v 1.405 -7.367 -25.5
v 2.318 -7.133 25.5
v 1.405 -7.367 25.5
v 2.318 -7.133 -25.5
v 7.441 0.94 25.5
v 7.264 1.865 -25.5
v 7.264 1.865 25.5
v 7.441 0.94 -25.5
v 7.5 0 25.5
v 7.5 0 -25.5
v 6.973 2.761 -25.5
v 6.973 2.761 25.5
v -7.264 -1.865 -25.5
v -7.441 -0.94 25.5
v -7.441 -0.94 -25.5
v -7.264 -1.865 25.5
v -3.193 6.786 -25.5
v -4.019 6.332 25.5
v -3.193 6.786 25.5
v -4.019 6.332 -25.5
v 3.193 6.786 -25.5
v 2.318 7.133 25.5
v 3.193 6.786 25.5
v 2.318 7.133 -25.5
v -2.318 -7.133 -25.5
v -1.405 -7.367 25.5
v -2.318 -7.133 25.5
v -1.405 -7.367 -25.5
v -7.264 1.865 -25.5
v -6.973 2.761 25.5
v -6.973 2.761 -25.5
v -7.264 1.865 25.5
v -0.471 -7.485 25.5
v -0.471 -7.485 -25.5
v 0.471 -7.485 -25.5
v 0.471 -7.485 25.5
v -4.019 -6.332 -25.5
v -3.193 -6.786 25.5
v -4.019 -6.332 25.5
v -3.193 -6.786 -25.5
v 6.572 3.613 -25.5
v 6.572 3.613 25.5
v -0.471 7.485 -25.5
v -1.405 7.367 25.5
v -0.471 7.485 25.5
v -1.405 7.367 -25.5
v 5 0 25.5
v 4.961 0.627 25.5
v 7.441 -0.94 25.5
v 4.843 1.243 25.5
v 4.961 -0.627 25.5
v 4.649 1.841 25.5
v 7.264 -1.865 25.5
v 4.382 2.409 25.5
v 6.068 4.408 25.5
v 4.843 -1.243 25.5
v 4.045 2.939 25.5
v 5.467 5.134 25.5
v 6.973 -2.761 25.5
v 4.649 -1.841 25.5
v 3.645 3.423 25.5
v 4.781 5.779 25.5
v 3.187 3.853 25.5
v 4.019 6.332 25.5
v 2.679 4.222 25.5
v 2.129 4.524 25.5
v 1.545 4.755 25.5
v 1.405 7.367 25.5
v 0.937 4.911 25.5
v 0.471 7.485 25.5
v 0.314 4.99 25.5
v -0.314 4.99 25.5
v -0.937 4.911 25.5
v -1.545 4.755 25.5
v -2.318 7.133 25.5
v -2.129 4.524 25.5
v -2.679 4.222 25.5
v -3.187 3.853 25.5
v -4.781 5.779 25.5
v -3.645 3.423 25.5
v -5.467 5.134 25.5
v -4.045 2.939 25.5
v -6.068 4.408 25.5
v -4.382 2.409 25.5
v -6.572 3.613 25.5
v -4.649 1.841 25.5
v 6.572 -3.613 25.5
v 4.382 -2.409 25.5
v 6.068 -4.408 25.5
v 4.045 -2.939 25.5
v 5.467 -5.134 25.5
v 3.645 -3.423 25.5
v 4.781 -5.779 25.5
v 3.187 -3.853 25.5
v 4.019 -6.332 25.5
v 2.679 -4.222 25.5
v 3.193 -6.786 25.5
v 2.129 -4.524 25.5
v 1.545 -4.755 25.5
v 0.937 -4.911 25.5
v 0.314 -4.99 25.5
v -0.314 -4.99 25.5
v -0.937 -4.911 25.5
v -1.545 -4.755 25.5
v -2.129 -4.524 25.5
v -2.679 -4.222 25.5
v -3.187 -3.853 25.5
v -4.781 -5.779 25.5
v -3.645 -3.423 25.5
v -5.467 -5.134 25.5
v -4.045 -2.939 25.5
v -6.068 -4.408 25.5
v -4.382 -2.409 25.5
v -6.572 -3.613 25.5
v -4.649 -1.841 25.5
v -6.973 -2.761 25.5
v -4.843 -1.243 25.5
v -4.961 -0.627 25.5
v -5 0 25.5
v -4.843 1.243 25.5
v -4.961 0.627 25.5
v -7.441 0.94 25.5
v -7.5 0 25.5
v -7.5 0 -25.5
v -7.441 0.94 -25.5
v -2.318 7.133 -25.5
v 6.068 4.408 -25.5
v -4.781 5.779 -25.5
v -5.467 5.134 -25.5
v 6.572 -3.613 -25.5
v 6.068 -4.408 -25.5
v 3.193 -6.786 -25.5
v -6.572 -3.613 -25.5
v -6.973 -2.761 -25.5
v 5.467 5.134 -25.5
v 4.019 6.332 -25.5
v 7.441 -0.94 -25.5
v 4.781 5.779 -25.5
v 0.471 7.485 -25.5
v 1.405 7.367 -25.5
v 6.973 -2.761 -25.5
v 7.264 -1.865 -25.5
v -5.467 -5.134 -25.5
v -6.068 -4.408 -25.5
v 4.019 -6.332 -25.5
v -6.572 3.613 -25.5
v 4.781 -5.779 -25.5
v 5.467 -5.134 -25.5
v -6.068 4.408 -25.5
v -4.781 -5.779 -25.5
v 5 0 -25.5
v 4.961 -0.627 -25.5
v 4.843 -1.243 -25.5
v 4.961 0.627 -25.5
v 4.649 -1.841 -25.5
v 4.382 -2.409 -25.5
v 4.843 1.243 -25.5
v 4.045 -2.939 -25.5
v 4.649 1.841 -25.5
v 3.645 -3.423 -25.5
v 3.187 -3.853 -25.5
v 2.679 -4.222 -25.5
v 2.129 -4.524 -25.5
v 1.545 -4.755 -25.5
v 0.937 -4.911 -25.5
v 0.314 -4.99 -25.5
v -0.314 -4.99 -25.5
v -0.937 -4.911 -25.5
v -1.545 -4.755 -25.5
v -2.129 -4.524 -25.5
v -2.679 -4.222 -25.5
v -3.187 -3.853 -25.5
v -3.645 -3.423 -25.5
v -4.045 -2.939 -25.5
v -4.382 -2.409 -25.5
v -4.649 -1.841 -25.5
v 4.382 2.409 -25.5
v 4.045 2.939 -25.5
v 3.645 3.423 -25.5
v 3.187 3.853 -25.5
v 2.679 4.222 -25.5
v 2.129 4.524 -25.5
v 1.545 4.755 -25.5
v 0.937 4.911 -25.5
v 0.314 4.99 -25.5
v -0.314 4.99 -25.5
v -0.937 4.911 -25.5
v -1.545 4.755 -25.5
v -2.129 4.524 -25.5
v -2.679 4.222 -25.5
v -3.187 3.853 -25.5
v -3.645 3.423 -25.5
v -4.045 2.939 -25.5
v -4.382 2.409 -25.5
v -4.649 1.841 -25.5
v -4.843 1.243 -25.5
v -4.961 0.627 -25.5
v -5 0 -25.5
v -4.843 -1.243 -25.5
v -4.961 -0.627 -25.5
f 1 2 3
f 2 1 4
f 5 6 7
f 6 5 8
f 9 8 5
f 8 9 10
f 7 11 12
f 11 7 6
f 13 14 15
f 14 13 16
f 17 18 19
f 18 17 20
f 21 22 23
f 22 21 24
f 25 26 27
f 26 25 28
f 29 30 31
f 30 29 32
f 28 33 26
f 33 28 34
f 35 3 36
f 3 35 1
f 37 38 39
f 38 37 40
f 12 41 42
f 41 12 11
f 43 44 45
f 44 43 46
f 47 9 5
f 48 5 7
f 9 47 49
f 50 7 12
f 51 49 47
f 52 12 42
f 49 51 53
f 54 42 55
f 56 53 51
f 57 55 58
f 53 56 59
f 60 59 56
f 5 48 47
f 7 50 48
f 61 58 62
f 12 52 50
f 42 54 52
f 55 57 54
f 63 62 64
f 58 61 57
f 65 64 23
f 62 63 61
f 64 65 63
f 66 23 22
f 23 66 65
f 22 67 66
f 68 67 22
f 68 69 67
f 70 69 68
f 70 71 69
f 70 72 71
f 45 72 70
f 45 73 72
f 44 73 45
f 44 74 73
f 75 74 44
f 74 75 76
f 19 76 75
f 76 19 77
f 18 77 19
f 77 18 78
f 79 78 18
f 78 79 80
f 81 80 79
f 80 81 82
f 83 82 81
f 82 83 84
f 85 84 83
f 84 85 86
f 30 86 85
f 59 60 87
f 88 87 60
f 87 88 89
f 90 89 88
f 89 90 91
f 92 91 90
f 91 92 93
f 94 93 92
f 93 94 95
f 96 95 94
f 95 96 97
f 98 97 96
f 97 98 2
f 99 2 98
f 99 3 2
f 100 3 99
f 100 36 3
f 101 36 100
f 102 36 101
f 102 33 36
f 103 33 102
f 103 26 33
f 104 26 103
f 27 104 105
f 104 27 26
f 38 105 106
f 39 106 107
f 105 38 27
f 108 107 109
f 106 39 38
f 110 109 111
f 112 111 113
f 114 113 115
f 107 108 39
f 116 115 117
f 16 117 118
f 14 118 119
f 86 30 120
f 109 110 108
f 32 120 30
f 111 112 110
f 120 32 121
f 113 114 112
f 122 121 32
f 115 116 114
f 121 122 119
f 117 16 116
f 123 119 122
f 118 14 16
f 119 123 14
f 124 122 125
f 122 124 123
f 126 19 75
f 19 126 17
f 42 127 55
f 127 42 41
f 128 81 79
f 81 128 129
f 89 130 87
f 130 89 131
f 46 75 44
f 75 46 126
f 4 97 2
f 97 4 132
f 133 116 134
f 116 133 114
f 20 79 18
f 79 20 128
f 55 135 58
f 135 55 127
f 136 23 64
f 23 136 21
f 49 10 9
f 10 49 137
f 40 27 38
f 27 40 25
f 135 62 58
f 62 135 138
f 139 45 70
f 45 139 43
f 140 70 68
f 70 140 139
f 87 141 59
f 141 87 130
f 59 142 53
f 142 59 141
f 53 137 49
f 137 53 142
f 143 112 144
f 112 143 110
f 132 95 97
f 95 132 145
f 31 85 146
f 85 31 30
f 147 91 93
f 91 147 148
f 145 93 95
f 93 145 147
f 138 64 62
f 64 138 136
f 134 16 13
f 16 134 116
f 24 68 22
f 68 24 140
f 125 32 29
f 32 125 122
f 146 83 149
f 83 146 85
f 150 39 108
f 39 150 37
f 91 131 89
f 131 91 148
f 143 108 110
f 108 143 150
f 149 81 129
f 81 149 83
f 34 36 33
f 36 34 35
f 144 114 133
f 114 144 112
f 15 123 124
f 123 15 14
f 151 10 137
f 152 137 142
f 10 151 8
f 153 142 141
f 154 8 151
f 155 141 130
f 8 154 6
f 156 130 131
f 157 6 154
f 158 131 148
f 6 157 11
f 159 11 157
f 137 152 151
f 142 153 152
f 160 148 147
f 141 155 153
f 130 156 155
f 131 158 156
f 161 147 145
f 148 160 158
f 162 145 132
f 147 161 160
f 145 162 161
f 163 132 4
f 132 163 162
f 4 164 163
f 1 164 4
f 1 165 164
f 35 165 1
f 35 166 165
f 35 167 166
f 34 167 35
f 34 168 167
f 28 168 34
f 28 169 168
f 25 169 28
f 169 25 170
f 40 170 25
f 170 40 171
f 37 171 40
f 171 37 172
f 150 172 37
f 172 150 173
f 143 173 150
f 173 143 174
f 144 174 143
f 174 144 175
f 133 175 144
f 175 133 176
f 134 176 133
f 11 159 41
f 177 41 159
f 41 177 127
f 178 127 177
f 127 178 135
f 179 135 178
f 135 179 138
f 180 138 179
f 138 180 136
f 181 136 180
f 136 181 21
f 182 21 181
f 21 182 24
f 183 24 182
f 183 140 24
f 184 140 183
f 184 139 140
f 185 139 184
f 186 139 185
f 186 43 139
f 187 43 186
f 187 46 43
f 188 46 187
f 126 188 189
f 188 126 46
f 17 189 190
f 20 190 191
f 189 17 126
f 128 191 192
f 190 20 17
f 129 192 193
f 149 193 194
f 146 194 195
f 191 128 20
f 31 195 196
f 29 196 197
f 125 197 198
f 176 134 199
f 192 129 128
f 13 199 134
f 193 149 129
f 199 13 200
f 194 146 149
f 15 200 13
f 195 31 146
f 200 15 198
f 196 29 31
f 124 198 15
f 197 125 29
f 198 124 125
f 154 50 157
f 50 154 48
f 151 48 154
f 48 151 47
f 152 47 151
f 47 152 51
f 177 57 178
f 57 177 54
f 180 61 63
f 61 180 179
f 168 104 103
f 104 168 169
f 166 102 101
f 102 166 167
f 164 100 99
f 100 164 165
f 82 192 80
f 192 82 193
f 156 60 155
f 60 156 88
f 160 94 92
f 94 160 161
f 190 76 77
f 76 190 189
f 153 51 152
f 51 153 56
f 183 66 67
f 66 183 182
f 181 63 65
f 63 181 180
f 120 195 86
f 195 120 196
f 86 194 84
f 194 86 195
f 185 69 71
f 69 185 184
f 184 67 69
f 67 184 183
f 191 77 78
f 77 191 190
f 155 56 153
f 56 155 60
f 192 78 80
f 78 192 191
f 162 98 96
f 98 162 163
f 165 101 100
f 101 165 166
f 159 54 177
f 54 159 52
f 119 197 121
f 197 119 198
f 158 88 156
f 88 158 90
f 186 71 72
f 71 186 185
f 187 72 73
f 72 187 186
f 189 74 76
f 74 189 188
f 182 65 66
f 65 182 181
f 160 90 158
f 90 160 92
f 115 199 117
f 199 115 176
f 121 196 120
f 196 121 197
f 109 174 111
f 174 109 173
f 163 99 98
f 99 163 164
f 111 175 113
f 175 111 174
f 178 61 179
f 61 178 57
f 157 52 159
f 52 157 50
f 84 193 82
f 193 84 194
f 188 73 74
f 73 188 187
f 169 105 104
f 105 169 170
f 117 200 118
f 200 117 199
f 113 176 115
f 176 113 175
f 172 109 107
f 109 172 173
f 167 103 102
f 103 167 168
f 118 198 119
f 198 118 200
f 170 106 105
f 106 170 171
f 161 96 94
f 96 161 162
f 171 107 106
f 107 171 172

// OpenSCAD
$fn = 50;


difference() {
	union() {
		translate(v = [0, 0, -25.5000000000]) {
			cylinder(h = 51, r = 7.5000000000);
		}
	}
	union() {
		translate(v = [0, 0, -100.0000000000]) {
			cylinder(h = 200, r = 5.0000000000);
		}
	}
}
